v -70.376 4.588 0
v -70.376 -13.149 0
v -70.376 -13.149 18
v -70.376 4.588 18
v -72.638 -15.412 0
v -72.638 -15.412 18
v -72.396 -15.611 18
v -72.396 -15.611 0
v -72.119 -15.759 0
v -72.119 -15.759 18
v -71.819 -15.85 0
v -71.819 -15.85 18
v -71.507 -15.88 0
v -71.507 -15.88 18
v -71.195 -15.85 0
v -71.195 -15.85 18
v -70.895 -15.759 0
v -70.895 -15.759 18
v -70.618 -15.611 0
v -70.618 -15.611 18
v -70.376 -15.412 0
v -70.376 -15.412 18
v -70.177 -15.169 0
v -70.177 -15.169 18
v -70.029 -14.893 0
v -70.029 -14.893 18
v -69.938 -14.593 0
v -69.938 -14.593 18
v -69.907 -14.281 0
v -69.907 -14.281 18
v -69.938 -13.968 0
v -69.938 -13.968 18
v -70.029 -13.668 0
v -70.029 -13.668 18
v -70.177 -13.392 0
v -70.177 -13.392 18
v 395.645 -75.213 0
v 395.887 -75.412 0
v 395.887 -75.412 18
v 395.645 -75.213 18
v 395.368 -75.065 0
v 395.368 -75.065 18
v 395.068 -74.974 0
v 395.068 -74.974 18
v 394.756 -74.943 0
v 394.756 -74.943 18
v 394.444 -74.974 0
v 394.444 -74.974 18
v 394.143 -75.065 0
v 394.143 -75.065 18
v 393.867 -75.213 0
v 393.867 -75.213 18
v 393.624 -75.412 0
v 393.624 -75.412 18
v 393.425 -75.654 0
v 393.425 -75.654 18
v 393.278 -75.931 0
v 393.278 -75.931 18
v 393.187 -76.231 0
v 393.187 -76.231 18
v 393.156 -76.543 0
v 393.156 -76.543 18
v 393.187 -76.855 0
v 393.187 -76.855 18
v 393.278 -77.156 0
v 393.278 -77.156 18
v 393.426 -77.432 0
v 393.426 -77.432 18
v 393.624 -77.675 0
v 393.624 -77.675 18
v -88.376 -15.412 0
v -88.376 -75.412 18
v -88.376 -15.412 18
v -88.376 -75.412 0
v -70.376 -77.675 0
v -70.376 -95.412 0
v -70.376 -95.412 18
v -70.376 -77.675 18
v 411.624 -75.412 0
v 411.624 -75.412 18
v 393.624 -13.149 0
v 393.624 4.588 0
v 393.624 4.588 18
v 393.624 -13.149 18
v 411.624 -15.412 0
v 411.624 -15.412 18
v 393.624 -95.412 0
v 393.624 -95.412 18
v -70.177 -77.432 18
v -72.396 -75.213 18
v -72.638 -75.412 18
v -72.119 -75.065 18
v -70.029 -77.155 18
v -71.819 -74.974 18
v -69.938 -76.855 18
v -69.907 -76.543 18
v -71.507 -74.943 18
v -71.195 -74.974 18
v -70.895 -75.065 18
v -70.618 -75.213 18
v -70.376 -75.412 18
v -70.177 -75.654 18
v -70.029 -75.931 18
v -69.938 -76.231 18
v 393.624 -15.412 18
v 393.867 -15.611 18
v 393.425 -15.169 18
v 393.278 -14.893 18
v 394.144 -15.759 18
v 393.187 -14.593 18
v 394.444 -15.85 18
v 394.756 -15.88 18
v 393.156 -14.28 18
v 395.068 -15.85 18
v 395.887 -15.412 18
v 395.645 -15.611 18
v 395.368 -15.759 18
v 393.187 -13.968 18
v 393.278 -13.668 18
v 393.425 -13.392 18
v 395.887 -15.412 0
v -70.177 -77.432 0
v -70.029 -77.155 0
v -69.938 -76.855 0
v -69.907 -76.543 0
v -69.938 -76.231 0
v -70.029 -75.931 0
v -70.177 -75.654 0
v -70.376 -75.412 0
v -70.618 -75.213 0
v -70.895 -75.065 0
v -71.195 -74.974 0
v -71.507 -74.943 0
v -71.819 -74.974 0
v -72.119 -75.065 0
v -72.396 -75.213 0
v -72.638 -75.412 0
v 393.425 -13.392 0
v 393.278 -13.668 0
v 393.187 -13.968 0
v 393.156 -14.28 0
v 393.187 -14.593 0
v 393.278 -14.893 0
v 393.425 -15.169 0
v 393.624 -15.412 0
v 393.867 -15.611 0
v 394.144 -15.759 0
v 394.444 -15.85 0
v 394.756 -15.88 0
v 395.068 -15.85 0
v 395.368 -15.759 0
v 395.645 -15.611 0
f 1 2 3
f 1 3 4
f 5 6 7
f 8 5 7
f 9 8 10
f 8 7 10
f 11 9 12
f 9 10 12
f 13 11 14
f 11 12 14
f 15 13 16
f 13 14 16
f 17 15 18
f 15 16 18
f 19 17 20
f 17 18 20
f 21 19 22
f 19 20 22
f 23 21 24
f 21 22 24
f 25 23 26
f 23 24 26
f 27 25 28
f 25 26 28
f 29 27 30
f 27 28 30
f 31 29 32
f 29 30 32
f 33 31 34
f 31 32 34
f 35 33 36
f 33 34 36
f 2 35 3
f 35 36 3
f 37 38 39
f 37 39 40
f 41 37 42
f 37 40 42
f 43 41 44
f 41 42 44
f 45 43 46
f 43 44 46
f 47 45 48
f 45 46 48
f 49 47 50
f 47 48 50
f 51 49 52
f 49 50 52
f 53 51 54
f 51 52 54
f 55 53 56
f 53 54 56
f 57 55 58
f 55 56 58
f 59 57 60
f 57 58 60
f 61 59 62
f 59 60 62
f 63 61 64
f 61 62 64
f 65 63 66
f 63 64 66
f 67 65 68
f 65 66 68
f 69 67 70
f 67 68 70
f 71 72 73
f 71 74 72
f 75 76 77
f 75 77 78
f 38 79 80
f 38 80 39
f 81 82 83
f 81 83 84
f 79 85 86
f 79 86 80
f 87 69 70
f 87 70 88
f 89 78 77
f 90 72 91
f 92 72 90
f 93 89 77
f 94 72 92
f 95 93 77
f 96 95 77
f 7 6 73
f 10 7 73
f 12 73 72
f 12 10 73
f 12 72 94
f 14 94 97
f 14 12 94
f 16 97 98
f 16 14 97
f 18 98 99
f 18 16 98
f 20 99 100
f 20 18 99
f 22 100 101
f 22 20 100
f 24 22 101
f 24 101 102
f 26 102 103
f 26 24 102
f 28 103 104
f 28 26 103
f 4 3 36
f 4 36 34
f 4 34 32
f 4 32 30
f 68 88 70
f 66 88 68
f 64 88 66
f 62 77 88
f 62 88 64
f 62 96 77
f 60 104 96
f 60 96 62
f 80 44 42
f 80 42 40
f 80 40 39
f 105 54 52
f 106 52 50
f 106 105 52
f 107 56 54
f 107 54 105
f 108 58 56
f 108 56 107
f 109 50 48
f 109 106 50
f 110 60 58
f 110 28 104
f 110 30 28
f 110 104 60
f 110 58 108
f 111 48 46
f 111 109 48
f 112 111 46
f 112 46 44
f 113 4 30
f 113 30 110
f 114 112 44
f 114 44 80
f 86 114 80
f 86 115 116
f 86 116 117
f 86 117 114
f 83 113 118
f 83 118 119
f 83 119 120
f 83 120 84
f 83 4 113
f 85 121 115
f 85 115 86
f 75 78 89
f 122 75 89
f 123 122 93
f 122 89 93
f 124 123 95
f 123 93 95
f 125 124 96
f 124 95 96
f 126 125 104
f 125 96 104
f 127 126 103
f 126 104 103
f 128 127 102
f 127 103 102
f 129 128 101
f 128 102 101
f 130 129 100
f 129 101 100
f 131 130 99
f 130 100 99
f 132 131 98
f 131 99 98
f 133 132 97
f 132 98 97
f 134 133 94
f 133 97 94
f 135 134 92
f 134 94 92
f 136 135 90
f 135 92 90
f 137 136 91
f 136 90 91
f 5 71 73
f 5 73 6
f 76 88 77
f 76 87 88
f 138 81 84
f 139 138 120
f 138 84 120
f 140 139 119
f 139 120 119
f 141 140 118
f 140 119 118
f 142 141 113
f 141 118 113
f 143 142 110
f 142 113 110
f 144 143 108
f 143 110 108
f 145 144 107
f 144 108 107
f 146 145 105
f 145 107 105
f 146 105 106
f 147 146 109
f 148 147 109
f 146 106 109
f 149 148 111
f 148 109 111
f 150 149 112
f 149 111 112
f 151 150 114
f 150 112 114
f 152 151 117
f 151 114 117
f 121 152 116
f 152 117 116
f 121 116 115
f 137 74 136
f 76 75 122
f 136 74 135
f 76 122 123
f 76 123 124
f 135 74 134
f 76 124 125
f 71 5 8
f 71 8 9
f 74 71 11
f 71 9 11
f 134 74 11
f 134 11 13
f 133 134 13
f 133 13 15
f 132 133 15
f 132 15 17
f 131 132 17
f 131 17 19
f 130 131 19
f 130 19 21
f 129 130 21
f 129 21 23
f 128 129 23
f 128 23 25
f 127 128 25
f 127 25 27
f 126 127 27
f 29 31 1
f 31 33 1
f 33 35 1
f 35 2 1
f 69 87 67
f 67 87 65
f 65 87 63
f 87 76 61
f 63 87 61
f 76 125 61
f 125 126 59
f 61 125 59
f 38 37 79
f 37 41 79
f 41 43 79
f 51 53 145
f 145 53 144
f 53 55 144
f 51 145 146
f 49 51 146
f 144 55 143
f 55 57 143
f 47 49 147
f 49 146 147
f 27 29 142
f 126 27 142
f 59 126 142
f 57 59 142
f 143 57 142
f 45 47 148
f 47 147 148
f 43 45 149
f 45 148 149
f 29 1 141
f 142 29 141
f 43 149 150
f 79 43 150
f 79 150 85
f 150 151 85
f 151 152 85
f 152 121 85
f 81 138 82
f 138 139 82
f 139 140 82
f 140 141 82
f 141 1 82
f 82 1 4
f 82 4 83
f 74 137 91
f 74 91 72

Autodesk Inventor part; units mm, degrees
ref_plane "YZ Plane" through (0, 0, 0) normal (1, 0, 0) x (0, 1, 0)
ref_plane "XZ Plane" through (0, 0, 0) normal (0, 1, 0) x (-1, 0, 0)
ref_plane "XY Plane" through (0, 0, 0) normal (0, 0, 1) x (1, 0, 0)
sketch "Sketch1" plane through (0, 0, 0) normal (0, 0, 1) x (1, 0, 0)
  line L0 (393.6245, -95.4118) -> (-70.3755, -95.4118)
  line L1 (-70.3755, 4.5882) -> (17.6245, 4.5882)
  line L2 (117.6245, 4.5882) -> (205.6245, 4.5882)
  line L3 (305.6245, 4.5882) -> (393.6245, 4.5882)
  line L4 (-88.3755, -15.4118) -> (-70.3755, -15.4118)
  line L5 (-70.3755, -75.4118) -> (-88.3755, -75.4118)
  line L6 (-88.3755, -75.4118) -> (-88.3755, -15.4118)
  line L7 (-70.3755, -95.4118) -> (-70.3755, -75.4118)
  line L8 (-70.3755, -15.4118) -> (-70.3755, 4.5882)
  line L9 (393.6245, -15.4118) -> (411.6245, -15.4118)
  line L10 (411.6245, -15.4118) -> (411.6245, -75.4118)
  line L11 (411.6245, -75.4118) -> (393.6245, -75.4118)
  line L12 (393.6245, 4.5882) -> (393.6245, -15.4118)
  line L13 (393.6245, -75.4118) -> (393.6245, -95.4118)
  line L14 (17.6245, 4.5882) -> (117.6245, 4.5882)
  line L15 (205.6245, 4.5882) -> (305.6245, 4.5882)
  point P0 (0, 0)
  dimension "d0" = 464
  dimension "d4" = 100
  dimension "d9" = 100
  dimension "d13" = 18
  dimension "d14" = 60
  dimension "d17" = 20
  dimension "d19" = 60
  dimension "d20" = 18
  dimension "d21" = 100
extrude "Extrusion1" add sketch "Sketch1" along normal blind 18
sketch "Sketch3" plane through (0, 0, 18) normal (0, 0, 1) x (1, 0, 0)
  line L0 (-70.3755, -15.4118) -> (-71.5069, -14.2805)
  line L1 (-70.3755, -15.4118) -> (-68.7755, -15.4118) construction
  line L2 (-70.3755, -75.4118) -> (-71.5069, -76.5432)
  line L3 (393.6245, -15.4118) -> (394.7558, -14.2805)
  line L4 (393.6245, -75.4118) -> (394.7558, -76.5432)
  circle A0 centre (-71.5069, -14.2805) radius 1.6
  circle A1 centre (-71.5069, -76.5432) radius 1.6
  circle A2 centre (394.7558, -14.2805) radius 1.6
  circle A3 centre (394.7558, -76.5432) radius 1.6
  point P0 (0, 0)
  dimension "d40" = 1.6
  dimension "d41" = 135
  dimension "d42" = 3.2
  dimension "d43" = 3.2
  dimension "d44" = 3.2
  dimension "d45" = 3.2
extrude "Extrusion3" cut sketch "Sketch3" against normal blind 20
properties part number "vigas" material "Wood (Birch)"
